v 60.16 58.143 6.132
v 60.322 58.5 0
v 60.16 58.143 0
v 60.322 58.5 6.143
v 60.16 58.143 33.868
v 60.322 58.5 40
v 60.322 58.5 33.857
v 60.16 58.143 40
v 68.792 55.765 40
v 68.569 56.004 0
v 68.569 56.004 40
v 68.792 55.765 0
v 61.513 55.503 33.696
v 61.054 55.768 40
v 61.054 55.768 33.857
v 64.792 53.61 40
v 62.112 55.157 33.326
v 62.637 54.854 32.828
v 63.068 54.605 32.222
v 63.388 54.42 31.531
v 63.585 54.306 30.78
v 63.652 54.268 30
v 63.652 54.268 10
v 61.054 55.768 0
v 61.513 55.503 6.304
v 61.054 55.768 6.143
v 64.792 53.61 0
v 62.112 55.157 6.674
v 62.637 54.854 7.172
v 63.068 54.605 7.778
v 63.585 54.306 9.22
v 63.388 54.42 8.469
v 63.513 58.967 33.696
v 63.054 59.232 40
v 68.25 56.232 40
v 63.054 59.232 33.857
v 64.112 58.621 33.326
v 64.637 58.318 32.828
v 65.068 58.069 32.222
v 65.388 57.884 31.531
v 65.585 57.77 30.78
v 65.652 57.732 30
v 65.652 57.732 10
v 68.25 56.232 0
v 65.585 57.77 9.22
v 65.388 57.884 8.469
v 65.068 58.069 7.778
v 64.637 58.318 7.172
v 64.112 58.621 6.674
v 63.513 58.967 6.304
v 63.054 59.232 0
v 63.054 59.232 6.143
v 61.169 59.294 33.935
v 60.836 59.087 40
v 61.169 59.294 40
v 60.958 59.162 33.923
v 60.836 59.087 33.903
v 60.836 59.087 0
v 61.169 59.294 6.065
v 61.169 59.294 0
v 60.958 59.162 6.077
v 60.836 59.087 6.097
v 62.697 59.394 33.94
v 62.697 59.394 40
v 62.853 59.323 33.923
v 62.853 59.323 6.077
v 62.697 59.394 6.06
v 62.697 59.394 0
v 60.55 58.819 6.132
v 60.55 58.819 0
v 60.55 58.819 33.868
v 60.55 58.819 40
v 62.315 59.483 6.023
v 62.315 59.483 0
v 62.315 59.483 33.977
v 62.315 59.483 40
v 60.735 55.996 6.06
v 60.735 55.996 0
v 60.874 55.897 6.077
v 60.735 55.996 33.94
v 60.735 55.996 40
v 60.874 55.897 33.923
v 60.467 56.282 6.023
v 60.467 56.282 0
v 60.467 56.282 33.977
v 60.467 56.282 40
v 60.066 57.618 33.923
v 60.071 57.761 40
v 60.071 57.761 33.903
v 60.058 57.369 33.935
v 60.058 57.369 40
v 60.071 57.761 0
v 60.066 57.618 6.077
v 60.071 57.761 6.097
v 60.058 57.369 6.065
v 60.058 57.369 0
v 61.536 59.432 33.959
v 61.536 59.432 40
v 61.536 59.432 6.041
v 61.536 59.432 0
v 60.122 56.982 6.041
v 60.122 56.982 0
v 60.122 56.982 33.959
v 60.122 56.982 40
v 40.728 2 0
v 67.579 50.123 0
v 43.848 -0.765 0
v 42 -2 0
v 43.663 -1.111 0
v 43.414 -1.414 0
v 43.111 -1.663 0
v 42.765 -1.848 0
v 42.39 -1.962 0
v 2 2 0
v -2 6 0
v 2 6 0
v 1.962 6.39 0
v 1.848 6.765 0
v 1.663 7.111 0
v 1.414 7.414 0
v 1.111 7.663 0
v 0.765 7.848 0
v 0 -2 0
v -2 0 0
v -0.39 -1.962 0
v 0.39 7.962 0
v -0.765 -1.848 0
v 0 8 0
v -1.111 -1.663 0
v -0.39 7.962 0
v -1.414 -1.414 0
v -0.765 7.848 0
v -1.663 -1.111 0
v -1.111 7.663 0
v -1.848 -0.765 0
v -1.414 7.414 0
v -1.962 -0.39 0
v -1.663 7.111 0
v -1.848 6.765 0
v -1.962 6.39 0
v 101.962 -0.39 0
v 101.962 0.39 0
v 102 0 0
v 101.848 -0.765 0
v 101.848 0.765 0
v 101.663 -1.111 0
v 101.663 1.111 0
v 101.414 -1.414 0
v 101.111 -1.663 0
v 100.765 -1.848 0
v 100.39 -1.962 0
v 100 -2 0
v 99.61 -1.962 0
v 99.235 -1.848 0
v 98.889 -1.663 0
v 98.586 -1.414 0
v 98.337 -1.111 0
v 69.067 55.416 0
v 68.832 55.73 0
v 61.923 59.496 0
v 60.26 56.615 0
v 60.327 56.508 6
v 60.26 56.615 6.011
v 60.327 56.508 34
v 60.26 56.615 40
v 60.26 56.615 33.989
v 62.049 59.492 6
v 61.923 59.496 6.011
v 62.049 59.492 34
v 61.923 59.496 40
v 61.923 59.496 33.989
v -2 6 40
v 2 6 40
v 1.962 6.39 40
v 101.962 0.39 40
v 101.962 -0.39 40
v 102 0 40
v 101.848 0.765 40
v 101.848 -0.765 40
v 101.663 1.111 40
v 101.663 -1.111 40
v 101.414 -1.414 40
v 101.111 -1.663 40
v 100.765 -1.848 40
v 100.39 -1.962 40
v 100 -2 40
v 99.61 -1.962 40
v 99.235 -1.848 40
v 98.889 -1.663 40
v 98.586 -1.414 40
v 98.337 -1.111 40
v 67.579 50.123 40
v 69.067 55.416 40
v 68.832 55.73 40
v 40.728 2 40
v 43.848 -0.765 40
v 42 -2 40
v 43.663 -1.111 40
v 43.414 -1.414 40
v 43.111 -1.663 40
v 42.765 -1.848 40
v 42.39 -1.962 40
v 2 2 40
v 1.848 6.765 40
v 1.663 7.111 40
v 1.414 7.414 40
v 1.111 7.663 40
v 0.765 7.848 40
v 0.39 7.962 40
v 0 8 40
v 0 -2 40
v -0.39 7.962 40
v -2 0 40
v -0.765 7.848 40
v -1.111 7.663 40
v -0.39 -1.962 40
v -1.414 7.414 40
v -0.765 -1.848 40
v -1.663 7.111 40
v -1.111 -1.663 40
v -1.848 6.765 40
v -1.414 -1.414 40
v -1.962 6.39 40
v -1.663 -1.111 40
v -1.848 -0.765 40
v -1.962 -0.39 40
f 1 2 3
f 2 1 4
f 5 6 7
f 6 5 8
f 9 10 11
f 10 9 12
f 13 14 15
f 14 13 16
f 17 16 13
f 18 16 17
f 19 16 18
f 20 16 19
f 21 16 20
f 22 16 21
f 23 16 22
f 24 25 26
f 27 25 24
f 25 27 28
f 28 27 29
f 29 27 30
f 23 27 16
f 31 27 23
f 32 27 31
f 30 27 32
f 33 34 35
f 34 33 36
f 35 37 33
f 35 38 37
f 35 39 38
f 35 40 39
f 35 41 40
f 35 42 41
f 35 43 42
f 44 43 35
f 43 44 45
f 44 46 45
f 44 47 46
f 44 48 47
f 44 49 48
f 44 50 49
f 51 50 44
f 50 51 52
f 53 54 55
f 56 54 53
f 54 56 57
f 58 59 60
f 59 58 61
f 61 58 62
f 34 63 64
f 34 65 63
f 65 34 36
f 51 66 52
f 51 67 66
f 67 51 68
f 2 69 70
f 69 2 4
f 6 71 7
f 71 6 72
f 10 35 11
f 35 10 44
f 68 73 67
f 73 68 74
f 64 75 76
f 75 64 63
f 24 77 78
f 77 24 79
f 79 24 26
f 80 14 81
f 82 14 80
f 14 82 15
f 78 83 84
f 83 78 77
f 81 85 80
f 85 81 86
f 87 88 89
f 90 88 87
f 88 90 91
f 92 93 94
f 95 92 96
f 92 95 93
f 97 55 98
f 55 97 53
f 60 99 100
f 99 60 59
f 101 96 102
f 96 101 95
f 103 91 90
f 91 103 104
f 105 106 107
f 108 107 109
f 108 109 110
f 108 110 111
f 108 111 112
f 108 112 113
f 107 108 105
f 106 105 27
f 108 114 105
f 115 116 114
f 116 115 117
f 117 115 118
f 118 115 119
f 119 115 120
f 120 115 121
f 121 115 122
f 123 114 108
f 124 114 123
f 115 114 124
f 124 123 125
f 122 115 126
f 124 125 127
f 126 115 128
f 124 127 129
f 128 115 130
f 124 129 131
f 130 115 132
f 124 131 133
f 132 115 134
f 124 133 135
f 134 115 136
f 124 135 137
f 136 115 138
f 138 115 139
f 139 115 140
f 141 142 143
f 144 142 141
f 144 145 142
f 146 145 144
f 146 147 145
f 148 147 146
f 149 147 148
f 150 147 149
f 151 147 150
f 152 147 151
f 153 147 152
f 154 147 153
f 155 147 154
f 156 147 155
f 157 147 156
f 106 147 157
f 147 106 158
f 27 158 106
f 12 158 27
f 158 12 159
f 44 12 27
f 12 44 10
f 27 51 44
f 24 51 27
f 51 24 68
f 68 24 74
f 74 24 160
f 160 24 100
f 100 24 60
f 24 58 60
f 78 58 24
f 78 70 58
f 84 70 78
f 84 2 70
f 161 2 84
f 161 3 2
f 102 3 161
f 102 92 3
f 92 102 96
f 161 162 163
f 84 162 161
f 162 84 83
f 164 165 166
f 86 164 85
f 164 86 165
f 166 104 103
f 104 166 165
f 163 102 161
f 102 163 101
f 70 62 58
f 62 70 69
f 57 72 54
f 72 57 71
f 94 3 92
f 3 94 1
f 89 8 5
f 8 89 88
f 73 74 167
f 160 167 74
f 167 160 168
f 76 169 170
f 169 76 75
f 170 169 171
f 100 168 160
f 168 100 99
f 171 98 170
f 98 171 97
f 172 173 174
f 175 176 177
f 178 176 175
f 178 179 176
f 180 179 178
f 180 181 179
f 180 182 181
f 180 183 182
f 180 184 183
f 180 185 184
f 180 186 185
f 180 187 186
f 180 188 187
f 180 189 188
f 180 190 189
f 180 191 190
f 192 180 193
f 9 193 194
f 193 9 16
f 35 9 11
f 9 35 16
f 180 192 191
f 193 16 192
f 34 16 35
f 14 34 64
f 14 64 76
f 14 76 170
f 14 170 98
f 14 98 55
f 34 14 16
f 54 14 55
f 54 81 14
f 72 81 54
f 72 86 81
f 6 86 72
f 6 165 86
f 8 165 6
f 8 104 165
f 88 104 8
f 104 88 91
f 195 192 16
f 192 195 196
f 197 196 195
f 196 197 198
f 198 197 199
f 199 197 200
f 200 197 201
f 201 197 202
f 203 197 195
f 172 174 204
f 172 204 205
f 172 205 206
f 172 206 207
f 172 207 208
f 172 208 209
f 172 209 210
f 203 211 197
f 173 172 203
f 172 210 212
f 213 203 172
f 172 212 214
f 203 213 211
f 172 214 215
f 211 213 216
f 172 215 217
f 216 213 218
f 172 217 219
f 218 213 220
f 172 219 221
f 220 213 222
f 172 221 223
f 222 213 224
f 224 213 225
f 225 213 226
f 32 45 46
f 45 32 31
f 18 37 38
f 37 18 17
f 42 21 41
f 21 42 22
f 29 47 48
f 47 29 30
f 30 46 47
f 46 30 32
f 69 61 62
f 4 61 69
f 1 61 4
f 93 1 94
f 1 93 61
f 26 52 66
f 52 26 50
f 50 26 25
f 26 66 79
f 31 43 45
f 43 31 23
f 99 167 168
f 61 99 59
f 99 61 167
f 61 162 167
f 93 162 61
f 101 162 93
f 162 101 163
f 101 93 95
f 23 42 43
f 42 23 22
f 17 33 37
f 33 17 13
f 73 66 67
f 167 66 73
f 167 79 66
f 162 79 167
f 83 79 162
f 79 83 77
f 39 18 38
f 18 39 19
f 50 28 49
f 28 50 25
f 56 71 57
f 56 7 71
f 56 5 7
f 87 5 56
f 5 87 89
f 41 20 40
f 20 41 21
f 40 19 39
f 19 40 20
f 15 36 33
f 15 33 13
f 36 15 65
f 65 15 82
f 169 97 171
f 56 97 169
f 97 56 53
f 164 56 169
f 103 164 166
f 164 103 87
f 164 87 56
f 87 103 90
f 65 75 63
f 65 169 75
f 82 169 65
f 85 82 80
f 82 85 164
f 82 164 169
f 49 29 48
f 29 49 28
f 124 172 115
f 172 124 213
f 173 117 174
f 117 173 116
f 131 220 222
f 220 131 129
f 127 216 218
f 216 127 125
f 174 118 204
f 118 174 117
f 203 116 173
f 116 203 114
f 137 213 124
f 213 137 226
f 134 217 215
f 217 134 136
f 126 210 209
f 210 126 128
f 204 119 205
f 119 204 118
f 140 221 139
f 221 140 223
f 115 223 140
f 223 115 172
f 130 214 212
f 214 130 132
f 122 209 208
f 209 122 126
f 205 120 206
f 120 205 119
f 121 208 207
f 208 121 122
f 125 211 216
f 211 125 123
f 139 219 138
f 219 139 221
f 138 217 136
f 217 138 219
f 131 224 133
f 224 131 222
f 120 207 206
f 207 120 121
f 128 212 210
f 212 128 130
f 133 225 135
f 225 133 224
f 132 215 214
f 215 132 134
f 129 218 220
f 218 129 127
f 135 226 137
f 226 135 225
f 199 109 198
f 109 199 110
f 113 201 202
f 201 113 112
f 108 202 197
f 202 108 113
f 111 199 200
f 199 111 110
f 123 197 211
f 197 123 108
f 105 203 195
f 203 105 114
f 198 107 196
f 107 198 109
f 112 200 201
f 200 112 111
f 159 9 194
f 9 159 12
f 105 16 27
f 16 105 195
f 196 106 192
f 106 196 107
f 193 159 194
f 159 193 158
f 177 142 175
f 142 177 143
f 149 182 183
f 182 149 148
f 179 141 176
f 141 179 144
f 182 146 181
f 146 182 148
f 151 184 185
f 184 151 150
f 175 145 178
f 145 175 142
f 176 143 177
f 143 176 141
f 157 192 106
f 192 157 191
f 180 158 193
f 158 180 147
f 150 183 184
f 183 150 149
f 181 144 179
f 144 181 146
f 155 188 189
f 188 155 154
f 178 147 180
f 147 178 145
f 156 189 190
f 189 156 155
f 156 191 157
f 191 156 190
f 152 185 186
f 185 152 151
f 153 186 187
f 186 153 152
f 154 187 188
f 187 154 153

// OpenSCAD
$fn=32;


hull() {
  translate([0,6,0]) cylinder(d=4,h=40);
  cylinder(d=4, h=40);
}

hull() {
  cylinder(d=4, h=40);
  translate([42,0,0]) cylinder(d=4, h=40);
}

translate([42,0,0])
hull() {
  cylinder(d=4, h=40);
  rotate([0,0,65]) translate([60,0,0]) cylinder(d=4, h=40);
}

hull() {
  translate([42,0,0]) rotate([0,0,65]) translate([60,0,0]) cylinder(d=4, h=40);
  translate([100,0,0]) cylinder(d=4, h=40);
}

translate([67.25,54.5,0])
rotate([0,0,-30])
  difference() {
    hull() {
      translate([0,0,0]) cylinder(d=4, h=40);
      translate([-6,0,0]) cylinder(d=4, h=40);
    }
    
    // translate([-18.5,2,20]) rotate([-90,0,-30]) cylinder(d=30,h=10);
    
    translate([-7,-5,10])
    rotate([0,0,90]) hull() {
      translate([0,0,20]) rotate([0,90,0]) cylinder(d=8, h=10);
      translate([0,0,0]) rotate([0,90,0]) cylinder(d=8, h=10);
    }
}
